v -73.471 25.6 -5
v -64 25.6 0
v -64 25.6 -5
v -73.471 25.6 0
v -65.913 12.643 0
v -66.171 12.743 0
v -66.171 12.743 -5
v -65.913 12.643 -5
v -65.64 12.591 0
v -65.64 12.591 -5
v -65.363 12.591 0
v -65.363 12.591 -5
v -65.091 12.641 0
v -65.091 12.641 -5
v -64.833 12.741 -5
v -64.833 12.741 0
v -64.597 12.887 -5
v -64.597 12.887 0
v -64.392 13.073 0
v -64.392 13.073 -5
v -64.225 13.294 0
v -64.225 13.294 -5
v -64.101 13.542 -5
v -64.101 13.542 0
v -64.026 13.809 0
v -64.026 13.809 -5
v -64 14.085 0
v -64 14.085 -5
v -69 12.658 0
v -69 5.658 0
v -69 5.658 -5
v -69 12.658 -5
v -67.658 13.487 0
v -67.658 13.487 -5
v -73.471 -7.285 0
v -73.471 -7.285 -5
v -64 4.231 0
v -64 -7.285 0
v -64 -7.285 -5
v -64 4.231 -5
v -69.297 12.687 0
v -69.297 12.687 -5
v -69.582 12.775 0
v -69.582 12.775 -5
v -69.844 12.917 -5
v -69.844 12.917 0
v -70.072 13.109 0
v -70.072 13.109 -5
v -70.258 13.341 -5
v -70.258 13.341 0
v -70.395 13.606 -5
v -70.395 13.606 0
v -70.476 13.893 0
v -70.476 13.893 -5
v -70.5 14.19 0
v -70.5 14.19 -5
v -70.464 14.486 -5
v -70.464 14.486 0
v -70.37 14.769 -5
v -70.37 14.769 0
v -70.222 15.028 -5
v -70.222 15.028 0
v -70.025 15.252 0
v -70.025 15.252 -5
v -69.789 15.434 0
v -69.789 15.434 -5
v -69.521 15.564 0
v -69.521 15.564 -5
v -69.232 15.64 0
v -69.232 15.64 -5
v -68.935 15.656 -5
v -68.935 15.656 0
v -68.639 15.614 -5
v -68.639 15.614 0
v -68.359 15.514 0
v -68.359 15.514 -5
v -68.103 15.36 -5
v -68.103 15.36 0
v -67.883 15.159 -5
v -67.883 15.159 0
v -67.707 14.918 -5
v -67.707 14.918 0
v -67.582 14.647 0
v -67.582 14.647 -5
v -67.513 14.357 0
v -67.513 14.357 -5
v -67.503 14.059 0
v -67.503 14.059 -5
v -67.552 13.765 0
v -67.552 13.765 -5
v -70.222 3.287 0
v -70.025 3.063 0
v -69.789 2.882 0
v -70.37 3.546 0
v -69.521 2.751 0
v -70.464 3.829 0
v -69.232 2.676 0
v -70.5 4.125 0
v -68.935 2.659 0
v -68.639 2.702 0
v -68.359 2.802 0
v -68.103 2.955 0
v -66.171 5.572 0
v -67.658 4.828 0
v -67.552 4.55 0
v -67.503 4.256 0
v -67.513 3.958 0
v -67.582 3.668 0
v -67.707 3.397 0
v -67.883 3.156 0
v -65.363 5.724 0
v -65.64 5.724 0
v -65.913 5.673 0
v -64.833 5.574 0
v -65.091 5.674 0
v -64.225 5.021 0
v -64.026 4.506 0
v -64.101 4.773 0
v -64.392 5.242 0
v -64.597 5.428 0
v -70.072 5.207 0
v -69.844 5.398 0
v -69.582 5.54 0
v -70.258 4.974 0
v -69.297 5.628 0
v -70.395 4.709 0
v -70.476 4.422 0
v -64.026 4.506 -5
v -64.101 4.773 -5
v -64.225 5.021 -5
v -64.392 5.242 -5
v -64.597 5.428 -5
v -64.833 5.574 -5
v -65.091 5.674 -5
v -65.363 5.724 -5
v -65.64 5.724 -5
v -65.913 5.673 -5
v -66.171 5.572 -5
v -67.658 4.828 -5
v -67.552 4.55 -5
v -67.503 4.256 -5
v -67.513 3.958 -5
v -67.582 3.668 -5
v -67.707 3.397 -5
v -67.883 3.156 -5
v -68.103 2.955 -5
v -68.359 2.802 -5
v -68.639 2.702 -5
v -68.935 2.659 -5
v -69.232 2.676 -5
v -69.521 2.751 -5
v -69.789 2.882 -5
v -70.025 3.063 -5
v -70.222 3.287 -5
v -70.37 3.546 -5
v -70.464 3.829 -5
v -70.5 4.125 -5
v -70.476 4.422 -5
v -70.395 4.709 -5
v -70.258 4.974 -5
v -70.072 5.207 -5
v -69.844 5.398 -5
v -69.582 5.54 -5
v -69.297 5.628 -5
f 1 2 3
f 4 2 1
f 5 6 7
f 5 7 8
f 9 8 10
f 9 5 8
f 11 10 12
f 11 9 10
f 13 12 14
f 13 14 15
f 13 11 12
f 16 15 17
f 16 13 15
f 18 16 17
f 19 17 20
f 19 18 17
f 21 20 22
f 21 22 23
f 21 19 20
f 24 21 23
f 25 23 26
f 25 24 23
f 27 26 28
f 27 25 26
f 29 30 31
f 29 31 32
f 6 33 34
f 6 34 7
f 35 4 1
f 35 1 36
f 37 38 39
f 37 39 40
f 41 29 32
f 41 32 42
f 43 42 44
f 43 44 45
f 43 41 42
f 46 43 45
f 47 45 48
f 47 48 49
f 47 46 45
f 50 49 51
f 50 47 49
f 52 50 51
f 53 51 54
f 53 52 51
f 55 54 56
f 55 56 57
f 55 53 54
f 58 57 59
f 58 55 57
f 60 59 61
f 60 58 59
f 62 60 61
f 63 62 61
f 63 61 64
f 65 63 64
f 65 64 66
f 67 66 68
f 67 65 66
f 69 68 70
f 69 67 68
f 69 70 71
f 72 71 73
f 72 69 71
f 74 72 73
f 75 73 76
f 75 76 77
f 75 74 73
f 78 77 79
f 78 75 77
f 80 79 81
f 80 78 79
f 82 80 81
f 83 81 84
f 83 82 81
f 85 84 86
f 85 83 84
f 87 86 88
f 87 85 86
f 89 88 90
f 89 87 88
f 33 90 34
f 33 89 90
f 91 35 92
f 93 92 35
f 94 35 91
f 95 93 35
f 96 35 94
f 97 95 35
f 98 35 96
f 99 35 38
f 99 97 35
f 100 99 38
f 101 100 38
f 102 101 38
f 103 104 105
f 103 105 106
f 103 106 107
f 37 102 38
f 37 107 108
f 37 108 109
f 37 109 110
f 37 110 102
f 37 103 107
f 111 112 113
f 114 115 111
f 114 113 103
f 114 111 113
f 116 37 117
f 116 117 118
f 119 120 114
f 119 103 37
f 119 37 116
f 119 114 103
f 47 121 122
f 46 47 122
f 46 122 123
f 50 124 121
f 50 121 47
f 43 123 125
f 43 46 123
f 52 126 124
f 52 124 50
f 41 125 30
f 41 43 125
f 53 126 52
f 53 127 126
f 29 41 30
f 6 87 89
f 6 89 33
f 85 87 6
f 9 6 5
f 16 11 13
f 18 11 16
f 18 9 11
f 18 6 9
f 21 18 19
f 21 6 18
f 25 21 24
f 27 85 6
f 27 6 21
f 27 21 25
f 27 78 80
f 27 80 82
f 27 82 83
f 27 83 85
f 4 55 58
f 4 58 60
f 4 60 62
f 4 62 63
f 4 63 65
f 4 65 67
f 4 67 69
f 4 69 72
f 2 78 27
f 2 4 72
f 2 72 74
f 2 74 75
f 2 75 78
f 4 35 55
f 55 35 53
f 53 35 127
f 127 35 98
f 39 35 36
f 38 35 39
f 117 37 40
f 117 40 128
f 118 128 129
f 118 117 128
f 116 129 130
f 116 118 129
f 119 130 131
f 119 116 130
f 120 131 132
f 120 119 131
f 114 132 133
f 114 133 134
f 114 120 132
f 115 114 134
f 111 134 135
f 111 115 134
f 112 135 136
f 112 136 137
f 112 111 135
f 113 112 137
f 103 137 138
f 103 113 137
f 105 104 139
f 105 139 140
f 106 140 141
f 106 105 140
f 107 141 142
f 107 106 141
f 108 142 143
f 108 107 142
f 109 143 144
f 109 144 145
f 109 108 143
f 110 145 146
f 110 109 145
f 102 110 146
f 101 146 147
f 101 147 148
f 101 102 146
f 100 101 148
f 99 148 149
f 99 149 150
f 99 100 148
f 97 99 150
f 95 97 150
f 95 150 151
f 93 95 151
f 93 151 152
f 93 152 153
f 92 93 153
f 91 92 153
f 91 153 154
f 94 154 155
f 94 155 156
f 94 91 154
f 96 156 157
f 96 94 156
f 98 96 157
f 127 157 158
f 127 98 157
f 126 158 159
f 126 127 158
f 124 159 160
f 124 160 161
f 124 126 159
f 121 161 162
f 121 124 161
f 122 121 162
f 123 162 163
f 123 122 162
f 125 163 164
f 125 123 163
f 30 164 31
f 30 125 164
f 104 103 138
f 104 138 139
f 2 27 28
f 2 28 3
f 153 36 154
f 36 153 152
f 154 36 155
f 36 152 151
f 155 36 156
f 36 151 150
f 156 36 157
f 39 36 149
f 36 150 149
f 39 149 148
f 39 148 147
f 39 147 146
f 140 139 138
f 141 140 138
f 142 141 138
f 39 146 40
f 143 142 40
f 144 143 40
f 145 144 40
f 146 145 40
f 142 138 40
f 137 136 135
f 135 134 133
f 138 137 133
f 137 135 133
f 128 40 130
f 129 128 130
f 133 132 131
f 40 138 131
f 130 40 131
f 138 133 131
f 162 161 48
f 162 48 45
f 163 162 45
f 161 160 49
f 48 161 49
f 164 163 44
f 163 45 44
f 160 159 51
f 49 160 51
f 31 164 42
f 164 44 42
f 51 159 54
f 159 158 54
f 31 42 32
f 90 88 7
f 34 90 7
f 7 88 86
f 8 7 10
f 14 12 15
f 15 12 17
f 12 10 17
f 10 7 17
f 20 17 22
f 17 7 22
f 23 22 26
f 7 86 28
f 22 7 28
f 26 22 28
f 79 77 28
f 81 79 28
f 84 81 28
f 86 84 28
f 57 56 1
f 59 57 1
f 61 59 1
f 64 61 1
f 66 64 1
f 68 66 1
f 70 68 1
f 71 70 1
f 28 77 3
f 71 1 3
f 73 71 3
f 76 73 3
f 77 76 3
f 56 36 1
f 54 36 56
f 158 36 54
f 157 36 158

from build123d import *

# Parameters (mm, degrees)
SALIENTE_EXTRUIR1_DEPTH = 5


with BuildPart() as part:
    # Croquis1 → Saliente-Extruir1 (new body)
    with BuildSketch(Plane.XY):
        with BuildLine():
            Line((-64, 25.6), (-73.471195353, 25.6))
            Line((-73.471195353, 25.6), (-73.471195353, -7.284781413))
            Line((-73.471195353, -7.284781413), (-64, -7.284781413))
            Line((-64, -7.284781413), (-64, 4.23055831))
            ThreePointArc((-64, 4.23055831), (-64.711403332, 5.506534523), (-66.170820393, 5.572199097))
            Line((-66.170820393, 5.572199097), (-67.658359214, 4.828429687))
            ThreePointArc((-67.658359214, 4.828429687), (-69.788596668, 2.881633081), (-69, 5.657609293))
            Line((-69, 5.657609293), (-69, 12.657609293))
            ThreePointArc((-69, 12.657609293), (-69.788596668, 15.433585506), (-67.658359214, 13.4867889))
            Line((-67.658359214, 13.4867889), (-66.170820393, 12.74301949))
            ThreePointArc((-66.170820393, 12.74301949), (-64.711403332, 12.808684064), (-64, 14.084660276))
            Line((-64, 14.084660276), (-64, 25.6))
        make_face()
    extrude(amount=-SALIENTE_EXTRUIR1_DEPTH)


solid = part.part
